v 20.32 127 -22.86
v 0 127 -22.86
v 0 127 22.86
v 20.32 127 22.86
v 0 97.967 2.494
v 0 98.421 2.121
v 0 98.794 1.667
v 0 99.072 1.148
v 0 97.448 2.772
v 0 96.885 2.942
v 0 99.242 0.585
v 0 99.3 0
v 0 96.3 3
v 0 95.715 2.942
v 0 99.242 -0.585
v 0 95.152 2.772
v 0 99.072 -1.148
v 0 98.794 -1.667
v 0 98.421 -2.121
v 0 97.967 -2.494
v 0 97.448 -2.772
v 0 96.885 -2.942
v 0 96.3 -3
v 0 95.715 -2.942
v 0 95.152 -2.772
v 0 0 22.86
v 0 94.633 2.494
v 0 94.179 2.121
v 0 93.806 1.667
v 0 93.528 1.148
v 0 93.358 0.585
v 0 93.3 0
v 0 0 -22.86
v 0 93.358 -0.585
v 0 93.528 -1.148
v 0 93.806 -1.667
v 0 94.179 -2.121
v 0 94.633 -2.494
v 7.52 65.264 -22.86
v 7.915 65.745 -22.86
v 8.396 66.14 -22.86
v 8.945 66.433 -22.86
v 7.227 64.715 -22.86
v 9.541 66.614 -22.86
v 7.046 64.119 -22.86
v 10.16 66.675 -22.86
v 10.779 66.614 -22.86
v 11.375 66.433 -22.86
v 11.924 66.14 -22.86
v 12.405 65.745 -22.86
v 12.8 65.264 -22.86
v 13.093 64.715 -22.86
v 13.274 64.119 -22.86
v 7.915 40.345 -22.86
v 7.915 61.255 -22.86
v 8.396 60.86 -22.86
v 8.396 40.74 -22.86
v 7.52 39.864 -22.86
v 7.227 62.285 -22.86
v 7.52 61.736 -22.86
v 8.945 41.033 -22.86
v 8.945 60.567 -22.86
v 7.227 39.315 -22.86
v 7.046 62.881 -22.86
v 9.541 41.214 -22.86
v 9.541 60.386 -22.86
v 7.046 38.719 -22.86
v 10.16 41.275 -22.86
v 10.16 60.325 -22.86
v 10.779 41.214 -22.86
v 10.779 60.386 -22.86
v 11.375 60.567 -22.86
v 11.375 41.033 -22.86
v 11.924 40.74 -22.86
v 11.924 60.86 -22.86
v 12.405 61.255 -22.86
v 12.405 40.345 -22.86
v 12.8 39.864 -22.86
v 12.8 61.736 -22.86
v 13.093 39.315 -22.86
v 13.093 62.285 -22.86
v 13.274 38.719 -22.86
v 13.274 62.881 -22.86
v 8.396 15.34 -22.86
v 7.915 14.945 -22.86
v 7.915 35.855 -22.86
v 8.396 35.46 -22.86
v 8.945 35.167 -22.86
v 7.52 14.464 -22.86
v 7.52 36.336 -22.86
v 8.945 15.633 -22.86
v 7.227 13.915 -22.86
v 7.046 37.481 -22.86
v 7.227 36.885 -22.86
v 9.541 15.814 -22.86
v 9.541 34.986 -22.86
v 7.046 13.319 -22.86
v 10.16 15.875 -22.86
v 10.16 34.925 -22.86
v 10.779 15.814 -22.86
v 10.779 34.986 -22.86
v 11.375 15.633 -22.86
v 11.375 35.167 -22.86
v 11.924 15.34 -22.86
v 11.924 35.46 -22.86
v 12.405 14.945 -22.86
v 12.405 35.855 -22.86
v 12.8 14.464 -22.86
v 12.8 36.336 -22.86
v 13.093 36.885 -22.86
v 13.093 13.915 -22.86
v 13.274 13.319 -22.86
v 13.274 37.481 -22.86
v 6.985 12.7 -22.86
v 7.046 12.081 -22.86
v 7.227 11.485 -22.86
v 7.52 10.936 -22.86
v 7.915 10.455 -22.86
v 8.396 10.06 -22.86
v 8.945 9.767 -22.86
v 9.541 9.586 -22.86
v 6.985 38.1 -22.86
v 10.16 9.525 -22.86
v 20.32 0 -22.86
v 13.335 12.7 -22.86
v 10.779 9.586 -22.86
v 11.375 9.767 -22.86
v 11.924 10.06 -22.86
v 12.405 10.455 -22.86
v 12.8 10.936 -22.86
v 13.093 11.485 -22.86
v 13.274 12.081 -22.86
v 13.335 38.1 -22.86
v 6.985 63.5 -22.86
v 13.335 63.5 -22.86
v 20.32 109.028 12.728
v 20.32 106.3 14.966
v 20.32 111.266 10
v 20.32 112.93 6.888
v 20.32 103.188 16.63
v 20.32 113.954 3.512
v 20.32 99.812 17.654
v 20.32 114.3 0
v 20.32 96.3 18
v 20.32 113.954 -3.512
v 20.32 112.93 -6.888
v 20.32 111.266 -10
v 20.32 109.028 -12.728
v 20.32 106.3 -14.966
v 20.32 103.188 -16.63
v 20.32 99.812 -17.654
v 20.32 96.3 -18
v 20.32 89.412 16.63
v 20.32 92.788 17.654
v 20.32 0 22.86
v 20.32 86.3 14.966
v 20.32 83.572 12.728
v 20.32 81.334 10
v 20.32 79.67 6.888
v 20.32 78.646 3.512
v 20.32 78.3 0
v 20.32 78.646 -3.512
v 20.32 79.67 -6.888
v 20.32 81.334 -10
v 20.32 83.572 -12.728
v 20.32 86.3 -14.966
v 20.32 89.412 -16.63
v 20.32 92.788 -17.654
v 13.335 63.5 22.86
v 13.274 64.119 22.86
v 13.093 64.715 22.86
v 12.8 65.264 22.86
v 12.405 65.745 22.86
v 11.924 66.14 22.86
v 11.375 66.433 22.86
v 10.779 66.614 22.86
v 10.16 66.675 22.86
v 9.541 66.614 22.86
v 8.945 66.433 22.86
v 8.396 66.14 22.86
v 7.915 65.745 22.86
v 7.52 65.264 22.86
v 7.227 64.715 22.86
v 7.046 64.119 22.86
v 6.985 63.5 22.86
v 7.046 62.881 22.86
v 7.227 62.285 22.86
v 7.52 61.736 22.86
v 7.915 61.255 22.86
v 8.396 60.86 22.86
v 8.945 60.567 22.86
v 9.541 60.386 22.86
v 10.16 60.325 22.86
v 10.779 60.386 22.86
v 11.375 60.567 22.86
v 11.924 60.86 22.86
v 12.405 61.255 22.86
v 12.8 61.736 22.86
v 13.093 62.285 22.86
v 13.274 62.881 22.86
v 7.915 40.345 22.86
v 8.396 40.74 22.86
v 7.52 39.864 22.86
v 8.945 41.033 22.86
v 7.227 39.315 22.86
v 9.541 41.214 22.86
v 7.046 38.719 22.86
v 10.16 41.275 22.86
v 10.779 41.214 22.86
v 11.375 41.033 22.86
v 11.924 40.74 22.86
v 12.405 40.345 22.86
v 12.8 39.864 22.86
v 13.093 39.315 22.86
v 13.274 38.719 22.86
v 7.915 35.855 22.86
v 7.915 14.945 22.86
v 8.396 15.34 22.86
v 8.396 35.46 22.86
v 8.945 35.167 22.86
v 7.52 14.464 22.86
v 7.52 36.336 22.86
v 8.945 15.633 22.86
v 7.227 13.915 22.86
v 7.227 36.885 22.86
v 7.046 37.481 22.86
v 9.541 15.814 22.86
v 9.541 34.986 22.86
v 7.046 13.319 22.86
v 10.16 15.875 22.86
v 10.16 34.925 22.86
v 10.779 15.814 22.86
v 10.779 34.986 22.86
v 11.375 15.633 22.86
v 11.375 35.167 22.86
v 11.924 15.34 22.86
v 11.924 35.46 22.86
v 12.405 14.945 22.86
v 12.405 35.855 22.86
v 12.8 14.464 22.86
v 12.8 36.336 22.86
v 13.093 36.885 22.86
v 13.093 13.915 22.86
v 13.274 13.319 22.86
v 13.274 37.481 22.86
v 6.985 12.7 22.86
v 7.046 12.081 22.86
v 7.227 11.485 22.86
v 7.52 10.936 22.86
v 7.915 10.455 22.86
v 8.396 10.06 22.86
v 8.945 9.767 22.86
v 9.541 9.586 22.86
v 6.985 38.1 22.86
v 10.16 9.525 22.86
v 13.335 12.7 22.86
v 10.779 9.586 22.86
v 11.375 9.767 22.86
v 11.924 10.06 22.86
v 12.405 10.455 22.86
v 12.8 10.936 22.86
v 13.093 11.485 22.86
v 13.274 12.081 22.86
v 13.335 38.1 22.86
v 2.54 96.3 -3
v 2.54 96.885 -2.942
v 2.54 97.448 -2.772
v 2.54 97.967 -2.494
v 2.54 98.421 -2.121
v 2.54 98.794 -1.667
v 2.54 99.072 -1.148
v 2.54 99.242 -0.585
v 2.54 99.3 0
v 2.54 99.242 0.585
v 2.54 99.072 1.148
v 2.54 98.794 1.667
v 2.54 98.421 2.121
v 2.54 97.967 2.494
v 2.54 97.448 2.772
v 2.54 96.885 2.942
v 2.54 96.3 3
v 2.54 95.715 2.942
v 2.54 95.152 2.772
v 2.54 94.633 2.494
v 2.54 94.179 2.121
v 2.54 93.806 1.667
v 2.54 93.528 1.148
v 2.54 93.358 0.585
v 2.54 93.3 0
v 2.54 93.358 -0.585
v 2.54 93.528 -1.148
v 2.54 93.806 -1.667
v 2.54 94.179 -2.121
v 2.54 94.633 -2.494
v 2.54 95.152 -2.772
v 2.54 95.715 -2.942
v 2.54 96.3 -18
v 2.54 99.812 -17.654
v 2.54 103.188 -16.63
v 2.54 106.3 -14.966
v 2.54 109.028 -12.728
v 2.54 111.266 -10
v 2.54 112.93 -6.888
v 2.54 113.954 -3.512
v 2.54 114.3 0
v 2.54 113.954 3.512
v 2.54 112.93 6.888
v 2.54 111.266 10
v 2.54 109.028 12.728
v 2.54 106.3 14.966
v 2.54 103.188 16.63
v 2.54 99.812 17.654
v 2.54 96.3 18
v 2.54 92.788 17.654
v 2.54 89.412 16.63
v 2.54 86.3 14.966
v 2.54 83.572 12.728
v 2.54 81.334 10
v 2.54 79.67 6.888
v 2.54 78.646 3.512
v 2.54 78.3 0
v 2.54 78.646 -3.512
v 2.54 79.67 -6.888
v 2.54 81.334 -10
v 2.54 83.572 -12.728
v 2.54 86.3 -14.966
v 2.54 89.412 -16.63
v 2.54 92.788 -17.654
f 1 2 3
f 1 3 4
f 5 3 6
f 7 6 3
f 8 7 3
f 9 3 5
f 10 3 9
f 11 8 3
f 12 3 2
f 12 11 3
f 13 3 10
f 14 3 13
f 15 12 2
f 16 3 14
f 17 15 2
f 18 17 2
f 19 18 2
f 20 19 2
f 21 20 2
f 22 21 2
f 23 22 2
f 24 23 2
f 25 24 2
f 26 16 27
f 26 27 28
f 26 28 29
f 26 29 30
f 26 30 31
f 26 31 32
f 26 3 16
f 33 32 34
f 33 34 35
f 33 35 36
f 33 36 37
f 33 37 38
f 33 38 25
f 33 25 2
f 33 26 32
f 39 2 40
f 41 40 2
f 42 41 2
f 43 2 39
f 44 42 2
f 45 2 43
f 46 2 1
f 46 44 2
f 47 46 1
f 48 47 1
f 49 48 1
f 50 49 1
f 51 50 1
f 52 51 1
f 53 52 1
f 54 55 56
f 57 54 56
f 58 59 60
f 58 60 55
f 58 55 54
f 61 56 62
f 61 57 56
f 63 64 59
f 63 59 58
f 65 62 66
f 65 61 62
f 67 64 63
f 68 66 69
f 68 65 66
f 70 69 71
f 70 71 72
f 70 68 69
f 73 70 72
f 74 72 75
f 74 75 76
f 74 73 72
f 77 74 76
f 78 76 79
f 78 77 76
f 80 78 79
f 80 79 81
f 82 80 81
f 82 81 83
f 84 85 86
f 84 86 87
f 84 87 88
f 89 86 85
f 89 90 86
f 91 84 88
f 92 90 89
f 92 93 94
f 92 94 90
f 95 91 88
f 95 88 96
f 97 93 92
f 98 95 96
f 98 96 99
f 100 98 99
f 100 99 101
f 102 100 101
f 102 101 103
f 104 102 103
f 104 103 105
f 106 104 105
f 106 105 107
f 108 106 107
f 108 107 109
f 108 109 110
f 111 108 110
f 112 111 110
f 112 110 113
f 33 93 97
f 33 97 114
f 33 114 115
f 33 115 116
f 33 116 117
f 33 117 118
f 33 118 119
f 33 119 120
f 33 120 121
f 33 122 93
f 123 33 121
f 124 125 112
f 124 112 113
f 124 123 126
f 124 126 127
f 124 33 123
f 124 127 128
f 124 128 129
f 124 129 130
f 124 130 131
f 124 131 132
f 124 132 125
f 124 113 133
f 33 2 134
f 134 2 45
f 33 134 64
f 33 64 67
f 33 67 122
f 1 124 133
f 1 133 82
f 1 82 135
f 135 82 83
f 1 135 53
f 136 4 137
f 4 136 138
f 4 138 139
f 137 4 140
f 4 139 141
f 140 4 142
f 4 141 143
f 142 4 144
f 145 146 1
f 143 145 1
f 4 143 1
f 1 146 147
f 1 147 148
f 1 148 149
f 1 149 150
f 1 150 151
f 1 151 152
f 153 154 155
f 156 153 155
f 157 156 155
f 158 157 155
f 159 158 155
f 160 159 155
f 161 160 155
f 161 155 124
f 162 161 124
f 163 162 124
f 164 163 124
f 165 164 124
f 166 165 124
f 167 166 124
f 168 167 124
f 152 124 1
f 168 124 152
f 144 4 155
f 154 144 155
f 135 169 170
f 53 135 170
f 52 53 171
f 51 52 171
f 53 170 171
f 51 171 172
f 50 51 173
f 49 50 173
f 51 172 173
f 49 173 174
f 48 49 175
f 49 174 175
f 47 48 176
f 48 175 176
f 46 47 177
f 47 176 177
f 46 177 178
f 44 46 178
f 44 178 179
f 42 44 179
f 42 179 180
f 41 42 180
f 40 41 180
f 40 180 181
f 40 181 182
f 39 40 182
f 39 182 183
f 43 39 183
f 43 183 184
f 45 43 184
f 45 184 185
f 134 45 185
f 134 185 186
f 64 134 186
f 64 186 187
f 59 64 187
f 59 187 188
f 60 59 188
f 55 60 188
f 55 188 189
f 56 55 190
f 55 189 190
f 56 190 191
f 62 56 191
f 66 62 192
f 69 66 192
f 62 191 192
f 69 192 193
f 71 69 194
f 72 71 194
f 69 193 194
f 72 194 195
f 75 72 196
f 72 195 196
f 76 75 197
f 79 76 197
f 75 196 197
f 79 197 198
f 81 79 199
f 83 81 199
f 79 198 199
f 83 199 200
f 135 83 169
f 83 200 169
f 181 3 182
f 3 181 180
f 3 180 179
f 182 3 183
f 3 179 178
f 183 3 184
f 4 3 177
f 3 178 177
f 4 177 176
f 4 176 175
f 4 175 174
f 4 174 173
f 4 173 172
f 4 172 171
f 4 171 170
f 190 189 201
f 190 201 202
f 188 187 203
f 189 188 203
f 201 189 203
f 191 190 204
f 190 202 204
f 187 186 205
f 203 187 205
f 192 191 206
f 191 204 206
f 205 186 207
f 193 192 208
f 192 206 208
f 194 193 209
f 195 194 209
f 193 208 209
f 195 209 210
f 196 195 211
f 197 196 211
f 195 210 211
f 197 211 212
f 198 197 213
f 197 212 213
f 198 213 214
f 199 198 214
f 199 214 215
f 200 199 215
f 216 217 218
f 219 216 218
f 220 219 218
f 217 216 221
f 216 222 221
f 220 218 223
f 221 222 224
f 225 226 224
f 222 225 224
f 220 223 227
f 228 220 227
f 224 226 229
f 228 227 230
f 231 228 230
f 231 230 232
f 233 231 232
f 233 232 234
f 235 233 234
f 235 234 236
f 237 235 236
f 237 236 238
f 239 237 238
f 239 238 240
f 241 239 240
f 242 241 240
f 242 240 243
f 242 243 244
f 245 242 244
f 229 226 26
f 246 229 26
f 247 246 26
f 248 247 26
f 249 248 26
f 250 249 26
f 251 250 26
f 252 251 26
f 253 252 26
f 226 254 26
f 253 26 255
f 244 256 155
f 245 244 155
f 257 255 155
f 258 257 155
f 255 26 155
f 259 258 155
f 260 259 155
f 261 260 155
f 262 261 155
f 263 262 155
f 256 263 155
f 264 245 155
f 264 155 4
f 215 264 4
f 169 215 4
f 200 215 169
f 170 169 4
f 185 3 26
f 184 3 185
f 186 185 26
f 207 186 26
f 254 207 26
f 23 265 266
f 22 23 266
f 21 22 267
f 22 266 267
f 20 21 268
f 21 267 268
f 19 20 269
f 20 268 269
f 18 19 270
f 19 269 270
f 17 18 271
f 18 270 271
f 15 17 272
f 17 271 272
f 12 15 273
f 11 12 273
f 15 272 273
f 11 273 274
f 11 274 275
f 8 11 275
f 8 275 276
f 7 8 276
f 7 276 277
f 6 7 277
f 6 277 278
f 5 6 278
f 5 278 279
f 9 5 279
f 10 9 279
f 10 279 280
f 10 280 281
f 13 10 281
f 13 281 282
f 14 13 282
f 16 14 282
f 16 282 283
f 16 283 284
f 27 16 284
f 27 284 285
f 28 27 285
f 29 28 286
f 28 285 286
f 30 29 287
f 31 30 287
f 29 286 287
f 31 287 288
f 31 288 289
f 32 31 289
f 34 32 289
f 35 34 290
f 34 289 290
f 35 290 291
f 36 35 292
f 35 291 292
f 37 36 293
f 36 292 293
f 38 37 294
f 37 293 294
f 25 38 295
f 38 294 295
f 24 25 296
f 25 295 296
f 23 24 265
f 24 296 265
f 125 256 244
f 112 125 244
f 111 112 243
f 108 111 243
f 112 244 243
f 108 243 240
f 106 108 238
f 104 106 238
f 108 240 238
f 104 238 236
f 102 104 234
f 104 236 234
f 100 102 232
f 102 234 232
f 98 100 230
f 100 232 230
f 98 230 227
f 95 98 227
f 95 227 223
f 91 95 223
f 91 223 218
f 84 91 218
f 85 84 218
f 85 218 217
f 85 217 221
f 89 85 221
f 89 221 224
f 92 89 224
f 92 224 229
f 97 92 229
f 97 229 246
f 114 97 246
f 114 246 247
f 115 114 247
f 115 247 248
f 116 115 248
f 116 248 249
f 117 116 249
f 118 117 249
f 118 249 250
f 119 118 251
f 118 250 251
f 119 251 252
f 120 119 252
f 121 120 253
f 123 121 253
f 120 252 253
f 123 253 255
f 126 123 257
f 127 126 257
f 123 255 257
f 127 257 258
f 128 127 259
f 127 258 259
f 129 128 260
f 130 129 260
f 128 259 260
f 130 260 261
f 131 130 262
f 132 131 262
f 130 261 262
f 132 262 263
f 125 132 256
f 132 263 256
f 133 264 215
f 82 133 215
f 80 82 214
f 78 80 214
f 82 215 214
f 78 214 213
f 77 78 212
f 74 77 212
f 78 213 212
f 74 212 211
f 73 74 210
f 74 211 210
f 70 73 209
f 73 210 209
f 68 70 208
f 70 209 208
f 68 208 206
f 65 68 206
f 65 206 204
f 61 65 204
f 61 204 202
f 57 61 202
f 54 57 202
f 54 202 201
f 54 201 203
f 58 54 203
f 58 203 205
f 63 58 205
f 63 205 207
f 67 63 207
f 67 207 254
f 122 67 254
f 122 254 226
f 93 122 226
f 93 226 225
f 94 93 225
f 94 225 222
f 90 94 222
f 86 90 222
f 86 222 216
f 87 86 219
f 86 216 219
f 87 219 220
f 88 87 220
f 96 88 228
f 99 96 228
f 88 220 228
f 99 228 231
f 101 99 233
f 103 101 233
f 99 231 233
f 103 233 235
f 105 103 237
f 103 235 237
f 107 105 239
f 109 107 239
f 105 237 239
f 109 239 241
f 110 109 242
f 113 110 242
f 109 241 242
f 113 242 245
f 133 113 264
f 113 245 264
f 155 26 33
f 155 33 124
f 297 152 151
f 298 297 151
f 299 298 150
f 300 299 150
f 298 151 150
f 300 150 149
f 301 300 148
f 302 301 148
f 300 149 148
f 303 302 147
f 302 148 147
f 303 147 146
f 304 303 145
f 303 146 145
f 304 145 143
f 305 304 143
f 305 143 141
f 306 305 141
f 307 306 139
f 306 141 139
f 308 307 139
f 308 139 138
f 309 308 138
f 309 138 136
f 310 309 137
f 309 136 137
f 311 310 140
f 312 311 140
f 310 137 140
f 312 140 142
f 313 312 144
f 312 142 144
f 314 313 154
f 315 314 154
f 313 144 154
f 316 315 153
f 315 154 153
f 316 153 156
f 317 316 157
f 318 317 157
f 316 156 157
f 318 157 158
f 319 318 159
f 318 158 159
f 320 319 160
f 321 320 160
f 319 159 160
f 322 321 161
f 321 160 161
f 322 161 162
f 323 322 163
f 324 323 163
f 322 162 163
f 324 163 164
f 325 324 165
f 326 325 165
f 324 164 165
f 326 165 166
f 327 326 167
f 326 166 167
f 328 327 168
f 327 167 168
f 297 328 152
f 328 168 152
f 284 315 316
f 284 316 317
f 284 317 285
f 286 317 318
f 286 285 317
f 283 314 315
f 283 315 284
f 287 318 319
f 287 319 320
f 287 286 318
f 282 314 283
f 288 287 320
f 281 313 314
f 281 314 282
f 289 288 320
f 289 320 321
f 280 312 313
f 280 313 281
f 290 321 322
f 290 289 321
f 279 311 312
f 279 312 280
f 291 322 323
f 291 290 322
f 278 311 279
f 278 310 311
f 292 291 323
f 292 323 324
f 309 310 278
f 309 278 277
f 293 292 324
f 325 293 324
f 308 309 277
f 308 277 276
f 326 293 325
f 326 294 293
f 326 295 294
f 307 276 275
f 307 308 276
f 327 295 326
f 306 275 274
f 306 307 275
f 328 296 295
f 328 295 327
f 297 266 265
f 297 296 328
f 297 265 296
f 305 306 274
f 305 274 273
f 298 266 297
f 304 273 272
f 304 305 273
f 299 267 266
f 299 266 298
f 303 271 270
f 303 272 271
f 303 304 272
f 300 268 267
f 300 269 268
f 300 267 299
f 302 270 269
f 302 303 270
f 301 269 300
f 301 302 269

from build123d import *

# Parameters (mm, degrees)
SKETCH1_W           = 20.32
SKETCH1_H           = 76.2
BOSS_EXTRUDE1_DEPTH = 22.86
SKETCH2_R           = 3.175
CUT_EXTRUDE1_DEPTH  = 92.1573409
SKETCH3_W           = 20.32
SKETCH3_H           = 45.72
BOSS_EXTRUDE2_DEPTH = 50.8
SKETCH4_R           = 17.999964
CUT_EXTRUDE2_DEPTH  = 17.78
SKETCH5_R           = 2.999994
CUT_EXTRUDE3_DEPTH  = 131.260155074


with BuildPart() as part:
    # Sketch1 → Boss-Extrude1 (new, symmetric)
    with BuildSketch(Plane.XY):
        with Locations((10.16, 38.1)):
            Rectangle(SKETCH1_W, SKETCH1_H)
    extrude(amount=BOSS_EXTRUDE1_DEPTH, both=True)

    # Sketch2 → Cut-Extrude1 (cut, through all)
    with BuildSketch(Plane.XY.offset(22.86)):
        with Locations((10.16, 12.7)):
            Circle(SKETCH2_R)
        with Locations((10.16, 38.1)):
            Circle(SKETCH2_R)
        with Locations((10.16, 63.5)):
            Circle(SKETCH2_R)
    extrude(amount=-CUT_EXTRUDE1_DEPTH, mode=Mode.SUBTRACT)

    # Sketch3 → Boss-Extrude2 (add)
    with BuildSketch(Plane(origin=(0, 76.2, 0), x_dir=(1, 0, 0), z_dir=(0, 1, 0))):
        with Locations((10.16, 0)):
            Rectangle(SKETCH3_W, SKETCH3_H)
    extrude(amount=BOSS_EXTRUDE2_DEPTH)

    # Sketch4 → Cut-Extrude2 (cut)
    with BuildSketch(Plane(origin=(20.32, 0, 0), x_dir=(0, 0, -1), z_dir=(1, 0, 0))):
        with Locations((0, 96.300036)):
            Circle(SKETCH4_R)
    extrude(amount=-CUT_EXTRUDE2_DEPTH, mode=Mode.SUBTRACT)

    # Sketch5 → Cut-Extrude3 (cut, through all)
    with BuildSketch(Plane(origin=(2.54, 0, 0), x_dir=(0, 0, -1), z_dir=(1, 0, 0))):
        with Locations((0, 96.300036)):
            Circle(SKETCH5_R)
    extrude(amount=-CUT_EXTRUDE3_DEPTH, mode=Mode.SUBTRACT)


solid = part.part
